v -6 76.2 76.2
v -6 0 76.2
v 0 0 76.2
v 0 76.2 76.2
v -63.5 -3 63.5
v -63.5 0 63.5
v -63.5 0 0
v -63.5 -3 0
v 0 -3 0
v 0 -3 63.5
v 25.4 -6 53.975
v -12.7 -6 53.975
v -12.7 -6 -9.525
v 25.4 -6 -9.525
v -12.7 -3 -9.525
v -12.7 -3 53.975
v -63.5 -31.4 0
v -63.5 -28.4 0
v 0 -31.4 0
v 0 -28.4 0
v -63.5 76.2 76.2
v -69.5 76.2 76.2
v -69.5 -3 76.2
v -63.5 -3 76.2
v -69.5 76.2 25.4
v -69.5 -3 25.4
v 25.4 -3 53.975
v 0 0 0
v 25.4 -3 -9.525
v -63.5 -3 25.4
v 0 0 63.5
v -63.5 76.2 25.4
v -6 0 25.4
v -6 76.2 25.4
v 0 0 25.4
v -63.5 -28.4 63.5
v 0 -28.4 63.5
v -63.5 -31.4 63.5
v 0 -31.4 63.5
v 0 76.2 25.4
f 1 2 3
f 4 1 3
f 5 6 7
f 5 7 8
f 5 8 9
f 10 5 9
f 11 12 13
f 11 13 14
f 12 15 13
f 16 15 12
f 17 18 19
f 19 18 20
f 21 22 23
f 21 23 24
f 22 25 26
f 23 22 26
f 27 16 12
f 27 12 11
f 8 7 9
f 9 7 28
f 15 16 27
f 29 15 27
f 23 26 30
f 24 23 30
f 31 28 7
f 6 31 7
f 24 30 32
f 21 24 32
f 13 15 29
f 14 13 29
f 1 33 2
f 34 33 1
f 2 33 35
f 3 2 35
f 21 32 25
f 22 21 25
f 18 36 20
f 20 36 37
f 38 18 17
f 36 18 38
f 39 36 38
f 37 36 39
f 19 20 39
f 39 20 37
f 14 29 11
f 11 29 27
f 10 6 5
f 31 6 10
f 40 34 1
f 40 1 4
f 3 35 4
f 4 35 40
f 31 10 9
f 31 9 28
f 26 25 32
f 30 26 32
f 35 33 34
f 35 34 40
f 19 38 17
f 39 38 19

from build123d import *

# Parameters (mm, degrees)
F1_START  = 25.4
F1_DEPTH  = 50.8
F0_W      = 6
F0_H      = 76.2
F2_DEPTH  = 63.5
F3_W      = 38.1
F3_H      = 63.5
F4_DEPTH  = 3
F5_START  = 25.4
F2_FACE_W = 63.5
F2_FACE_H = 63.5
F5_DEPTH  = 3


with BuildPart() as f1:
    # F0 (on Top) → F1 (new body)
    with BuildSketch(Plane.XY.offset(F1_START)):
        Polygon((-63.5, -3), (-63.5, 0), (-63.5, 76.2), (-69.5, 76.2), (-69.5, -3), align=None)
    extrude(amount=F1_DEPTH)


with BuildPart() as f1b:
    # F0 (on Top) → F1, piece 2 (new body)
    with BuildSketch(Plane.XY.offset(F1_START)):
        with Locations((-3, 38.1)):
            Rectangle(F0_W, F0_H)
    extrude(amount=F1_DEPTH)


with BuildPart() as f2:
    # F0 (on Top) → F2 (new body)
    with BuildSketch(Plane.XY):
        Polygon((0, -3), (0, 0), (-6, 0), (-63.5, 0), (-63.5, -3), align=None)
    extrude(amount=F2_DEPTH)


with BuildPart() as f4:
    # F3 (on face) → F4 (new body)
    with BuildSketch(Plane.XZ.offset(3)):
        with Locations((6.35, 22.225)):
            Rectangle(F3_W, F3_H)
    extrude(amount=F4_DEPTH)


with BuildPart() as f5:
    # F2_face (on face) → F5 (new body)
    with BuildSketch(Plane(origin=(-31.75, -3, 31.75), x_dir=(1, 0, 0), z_dir=(0, -1, 0)).offset(F5_START)):
        Rectangle(F2_FACE_W, F2_FACE_H)
    extrude(amount=F5_DEPTH)


solid = Compound([f1.part, f1b.part, f2.part, f4.part, f5.part])
